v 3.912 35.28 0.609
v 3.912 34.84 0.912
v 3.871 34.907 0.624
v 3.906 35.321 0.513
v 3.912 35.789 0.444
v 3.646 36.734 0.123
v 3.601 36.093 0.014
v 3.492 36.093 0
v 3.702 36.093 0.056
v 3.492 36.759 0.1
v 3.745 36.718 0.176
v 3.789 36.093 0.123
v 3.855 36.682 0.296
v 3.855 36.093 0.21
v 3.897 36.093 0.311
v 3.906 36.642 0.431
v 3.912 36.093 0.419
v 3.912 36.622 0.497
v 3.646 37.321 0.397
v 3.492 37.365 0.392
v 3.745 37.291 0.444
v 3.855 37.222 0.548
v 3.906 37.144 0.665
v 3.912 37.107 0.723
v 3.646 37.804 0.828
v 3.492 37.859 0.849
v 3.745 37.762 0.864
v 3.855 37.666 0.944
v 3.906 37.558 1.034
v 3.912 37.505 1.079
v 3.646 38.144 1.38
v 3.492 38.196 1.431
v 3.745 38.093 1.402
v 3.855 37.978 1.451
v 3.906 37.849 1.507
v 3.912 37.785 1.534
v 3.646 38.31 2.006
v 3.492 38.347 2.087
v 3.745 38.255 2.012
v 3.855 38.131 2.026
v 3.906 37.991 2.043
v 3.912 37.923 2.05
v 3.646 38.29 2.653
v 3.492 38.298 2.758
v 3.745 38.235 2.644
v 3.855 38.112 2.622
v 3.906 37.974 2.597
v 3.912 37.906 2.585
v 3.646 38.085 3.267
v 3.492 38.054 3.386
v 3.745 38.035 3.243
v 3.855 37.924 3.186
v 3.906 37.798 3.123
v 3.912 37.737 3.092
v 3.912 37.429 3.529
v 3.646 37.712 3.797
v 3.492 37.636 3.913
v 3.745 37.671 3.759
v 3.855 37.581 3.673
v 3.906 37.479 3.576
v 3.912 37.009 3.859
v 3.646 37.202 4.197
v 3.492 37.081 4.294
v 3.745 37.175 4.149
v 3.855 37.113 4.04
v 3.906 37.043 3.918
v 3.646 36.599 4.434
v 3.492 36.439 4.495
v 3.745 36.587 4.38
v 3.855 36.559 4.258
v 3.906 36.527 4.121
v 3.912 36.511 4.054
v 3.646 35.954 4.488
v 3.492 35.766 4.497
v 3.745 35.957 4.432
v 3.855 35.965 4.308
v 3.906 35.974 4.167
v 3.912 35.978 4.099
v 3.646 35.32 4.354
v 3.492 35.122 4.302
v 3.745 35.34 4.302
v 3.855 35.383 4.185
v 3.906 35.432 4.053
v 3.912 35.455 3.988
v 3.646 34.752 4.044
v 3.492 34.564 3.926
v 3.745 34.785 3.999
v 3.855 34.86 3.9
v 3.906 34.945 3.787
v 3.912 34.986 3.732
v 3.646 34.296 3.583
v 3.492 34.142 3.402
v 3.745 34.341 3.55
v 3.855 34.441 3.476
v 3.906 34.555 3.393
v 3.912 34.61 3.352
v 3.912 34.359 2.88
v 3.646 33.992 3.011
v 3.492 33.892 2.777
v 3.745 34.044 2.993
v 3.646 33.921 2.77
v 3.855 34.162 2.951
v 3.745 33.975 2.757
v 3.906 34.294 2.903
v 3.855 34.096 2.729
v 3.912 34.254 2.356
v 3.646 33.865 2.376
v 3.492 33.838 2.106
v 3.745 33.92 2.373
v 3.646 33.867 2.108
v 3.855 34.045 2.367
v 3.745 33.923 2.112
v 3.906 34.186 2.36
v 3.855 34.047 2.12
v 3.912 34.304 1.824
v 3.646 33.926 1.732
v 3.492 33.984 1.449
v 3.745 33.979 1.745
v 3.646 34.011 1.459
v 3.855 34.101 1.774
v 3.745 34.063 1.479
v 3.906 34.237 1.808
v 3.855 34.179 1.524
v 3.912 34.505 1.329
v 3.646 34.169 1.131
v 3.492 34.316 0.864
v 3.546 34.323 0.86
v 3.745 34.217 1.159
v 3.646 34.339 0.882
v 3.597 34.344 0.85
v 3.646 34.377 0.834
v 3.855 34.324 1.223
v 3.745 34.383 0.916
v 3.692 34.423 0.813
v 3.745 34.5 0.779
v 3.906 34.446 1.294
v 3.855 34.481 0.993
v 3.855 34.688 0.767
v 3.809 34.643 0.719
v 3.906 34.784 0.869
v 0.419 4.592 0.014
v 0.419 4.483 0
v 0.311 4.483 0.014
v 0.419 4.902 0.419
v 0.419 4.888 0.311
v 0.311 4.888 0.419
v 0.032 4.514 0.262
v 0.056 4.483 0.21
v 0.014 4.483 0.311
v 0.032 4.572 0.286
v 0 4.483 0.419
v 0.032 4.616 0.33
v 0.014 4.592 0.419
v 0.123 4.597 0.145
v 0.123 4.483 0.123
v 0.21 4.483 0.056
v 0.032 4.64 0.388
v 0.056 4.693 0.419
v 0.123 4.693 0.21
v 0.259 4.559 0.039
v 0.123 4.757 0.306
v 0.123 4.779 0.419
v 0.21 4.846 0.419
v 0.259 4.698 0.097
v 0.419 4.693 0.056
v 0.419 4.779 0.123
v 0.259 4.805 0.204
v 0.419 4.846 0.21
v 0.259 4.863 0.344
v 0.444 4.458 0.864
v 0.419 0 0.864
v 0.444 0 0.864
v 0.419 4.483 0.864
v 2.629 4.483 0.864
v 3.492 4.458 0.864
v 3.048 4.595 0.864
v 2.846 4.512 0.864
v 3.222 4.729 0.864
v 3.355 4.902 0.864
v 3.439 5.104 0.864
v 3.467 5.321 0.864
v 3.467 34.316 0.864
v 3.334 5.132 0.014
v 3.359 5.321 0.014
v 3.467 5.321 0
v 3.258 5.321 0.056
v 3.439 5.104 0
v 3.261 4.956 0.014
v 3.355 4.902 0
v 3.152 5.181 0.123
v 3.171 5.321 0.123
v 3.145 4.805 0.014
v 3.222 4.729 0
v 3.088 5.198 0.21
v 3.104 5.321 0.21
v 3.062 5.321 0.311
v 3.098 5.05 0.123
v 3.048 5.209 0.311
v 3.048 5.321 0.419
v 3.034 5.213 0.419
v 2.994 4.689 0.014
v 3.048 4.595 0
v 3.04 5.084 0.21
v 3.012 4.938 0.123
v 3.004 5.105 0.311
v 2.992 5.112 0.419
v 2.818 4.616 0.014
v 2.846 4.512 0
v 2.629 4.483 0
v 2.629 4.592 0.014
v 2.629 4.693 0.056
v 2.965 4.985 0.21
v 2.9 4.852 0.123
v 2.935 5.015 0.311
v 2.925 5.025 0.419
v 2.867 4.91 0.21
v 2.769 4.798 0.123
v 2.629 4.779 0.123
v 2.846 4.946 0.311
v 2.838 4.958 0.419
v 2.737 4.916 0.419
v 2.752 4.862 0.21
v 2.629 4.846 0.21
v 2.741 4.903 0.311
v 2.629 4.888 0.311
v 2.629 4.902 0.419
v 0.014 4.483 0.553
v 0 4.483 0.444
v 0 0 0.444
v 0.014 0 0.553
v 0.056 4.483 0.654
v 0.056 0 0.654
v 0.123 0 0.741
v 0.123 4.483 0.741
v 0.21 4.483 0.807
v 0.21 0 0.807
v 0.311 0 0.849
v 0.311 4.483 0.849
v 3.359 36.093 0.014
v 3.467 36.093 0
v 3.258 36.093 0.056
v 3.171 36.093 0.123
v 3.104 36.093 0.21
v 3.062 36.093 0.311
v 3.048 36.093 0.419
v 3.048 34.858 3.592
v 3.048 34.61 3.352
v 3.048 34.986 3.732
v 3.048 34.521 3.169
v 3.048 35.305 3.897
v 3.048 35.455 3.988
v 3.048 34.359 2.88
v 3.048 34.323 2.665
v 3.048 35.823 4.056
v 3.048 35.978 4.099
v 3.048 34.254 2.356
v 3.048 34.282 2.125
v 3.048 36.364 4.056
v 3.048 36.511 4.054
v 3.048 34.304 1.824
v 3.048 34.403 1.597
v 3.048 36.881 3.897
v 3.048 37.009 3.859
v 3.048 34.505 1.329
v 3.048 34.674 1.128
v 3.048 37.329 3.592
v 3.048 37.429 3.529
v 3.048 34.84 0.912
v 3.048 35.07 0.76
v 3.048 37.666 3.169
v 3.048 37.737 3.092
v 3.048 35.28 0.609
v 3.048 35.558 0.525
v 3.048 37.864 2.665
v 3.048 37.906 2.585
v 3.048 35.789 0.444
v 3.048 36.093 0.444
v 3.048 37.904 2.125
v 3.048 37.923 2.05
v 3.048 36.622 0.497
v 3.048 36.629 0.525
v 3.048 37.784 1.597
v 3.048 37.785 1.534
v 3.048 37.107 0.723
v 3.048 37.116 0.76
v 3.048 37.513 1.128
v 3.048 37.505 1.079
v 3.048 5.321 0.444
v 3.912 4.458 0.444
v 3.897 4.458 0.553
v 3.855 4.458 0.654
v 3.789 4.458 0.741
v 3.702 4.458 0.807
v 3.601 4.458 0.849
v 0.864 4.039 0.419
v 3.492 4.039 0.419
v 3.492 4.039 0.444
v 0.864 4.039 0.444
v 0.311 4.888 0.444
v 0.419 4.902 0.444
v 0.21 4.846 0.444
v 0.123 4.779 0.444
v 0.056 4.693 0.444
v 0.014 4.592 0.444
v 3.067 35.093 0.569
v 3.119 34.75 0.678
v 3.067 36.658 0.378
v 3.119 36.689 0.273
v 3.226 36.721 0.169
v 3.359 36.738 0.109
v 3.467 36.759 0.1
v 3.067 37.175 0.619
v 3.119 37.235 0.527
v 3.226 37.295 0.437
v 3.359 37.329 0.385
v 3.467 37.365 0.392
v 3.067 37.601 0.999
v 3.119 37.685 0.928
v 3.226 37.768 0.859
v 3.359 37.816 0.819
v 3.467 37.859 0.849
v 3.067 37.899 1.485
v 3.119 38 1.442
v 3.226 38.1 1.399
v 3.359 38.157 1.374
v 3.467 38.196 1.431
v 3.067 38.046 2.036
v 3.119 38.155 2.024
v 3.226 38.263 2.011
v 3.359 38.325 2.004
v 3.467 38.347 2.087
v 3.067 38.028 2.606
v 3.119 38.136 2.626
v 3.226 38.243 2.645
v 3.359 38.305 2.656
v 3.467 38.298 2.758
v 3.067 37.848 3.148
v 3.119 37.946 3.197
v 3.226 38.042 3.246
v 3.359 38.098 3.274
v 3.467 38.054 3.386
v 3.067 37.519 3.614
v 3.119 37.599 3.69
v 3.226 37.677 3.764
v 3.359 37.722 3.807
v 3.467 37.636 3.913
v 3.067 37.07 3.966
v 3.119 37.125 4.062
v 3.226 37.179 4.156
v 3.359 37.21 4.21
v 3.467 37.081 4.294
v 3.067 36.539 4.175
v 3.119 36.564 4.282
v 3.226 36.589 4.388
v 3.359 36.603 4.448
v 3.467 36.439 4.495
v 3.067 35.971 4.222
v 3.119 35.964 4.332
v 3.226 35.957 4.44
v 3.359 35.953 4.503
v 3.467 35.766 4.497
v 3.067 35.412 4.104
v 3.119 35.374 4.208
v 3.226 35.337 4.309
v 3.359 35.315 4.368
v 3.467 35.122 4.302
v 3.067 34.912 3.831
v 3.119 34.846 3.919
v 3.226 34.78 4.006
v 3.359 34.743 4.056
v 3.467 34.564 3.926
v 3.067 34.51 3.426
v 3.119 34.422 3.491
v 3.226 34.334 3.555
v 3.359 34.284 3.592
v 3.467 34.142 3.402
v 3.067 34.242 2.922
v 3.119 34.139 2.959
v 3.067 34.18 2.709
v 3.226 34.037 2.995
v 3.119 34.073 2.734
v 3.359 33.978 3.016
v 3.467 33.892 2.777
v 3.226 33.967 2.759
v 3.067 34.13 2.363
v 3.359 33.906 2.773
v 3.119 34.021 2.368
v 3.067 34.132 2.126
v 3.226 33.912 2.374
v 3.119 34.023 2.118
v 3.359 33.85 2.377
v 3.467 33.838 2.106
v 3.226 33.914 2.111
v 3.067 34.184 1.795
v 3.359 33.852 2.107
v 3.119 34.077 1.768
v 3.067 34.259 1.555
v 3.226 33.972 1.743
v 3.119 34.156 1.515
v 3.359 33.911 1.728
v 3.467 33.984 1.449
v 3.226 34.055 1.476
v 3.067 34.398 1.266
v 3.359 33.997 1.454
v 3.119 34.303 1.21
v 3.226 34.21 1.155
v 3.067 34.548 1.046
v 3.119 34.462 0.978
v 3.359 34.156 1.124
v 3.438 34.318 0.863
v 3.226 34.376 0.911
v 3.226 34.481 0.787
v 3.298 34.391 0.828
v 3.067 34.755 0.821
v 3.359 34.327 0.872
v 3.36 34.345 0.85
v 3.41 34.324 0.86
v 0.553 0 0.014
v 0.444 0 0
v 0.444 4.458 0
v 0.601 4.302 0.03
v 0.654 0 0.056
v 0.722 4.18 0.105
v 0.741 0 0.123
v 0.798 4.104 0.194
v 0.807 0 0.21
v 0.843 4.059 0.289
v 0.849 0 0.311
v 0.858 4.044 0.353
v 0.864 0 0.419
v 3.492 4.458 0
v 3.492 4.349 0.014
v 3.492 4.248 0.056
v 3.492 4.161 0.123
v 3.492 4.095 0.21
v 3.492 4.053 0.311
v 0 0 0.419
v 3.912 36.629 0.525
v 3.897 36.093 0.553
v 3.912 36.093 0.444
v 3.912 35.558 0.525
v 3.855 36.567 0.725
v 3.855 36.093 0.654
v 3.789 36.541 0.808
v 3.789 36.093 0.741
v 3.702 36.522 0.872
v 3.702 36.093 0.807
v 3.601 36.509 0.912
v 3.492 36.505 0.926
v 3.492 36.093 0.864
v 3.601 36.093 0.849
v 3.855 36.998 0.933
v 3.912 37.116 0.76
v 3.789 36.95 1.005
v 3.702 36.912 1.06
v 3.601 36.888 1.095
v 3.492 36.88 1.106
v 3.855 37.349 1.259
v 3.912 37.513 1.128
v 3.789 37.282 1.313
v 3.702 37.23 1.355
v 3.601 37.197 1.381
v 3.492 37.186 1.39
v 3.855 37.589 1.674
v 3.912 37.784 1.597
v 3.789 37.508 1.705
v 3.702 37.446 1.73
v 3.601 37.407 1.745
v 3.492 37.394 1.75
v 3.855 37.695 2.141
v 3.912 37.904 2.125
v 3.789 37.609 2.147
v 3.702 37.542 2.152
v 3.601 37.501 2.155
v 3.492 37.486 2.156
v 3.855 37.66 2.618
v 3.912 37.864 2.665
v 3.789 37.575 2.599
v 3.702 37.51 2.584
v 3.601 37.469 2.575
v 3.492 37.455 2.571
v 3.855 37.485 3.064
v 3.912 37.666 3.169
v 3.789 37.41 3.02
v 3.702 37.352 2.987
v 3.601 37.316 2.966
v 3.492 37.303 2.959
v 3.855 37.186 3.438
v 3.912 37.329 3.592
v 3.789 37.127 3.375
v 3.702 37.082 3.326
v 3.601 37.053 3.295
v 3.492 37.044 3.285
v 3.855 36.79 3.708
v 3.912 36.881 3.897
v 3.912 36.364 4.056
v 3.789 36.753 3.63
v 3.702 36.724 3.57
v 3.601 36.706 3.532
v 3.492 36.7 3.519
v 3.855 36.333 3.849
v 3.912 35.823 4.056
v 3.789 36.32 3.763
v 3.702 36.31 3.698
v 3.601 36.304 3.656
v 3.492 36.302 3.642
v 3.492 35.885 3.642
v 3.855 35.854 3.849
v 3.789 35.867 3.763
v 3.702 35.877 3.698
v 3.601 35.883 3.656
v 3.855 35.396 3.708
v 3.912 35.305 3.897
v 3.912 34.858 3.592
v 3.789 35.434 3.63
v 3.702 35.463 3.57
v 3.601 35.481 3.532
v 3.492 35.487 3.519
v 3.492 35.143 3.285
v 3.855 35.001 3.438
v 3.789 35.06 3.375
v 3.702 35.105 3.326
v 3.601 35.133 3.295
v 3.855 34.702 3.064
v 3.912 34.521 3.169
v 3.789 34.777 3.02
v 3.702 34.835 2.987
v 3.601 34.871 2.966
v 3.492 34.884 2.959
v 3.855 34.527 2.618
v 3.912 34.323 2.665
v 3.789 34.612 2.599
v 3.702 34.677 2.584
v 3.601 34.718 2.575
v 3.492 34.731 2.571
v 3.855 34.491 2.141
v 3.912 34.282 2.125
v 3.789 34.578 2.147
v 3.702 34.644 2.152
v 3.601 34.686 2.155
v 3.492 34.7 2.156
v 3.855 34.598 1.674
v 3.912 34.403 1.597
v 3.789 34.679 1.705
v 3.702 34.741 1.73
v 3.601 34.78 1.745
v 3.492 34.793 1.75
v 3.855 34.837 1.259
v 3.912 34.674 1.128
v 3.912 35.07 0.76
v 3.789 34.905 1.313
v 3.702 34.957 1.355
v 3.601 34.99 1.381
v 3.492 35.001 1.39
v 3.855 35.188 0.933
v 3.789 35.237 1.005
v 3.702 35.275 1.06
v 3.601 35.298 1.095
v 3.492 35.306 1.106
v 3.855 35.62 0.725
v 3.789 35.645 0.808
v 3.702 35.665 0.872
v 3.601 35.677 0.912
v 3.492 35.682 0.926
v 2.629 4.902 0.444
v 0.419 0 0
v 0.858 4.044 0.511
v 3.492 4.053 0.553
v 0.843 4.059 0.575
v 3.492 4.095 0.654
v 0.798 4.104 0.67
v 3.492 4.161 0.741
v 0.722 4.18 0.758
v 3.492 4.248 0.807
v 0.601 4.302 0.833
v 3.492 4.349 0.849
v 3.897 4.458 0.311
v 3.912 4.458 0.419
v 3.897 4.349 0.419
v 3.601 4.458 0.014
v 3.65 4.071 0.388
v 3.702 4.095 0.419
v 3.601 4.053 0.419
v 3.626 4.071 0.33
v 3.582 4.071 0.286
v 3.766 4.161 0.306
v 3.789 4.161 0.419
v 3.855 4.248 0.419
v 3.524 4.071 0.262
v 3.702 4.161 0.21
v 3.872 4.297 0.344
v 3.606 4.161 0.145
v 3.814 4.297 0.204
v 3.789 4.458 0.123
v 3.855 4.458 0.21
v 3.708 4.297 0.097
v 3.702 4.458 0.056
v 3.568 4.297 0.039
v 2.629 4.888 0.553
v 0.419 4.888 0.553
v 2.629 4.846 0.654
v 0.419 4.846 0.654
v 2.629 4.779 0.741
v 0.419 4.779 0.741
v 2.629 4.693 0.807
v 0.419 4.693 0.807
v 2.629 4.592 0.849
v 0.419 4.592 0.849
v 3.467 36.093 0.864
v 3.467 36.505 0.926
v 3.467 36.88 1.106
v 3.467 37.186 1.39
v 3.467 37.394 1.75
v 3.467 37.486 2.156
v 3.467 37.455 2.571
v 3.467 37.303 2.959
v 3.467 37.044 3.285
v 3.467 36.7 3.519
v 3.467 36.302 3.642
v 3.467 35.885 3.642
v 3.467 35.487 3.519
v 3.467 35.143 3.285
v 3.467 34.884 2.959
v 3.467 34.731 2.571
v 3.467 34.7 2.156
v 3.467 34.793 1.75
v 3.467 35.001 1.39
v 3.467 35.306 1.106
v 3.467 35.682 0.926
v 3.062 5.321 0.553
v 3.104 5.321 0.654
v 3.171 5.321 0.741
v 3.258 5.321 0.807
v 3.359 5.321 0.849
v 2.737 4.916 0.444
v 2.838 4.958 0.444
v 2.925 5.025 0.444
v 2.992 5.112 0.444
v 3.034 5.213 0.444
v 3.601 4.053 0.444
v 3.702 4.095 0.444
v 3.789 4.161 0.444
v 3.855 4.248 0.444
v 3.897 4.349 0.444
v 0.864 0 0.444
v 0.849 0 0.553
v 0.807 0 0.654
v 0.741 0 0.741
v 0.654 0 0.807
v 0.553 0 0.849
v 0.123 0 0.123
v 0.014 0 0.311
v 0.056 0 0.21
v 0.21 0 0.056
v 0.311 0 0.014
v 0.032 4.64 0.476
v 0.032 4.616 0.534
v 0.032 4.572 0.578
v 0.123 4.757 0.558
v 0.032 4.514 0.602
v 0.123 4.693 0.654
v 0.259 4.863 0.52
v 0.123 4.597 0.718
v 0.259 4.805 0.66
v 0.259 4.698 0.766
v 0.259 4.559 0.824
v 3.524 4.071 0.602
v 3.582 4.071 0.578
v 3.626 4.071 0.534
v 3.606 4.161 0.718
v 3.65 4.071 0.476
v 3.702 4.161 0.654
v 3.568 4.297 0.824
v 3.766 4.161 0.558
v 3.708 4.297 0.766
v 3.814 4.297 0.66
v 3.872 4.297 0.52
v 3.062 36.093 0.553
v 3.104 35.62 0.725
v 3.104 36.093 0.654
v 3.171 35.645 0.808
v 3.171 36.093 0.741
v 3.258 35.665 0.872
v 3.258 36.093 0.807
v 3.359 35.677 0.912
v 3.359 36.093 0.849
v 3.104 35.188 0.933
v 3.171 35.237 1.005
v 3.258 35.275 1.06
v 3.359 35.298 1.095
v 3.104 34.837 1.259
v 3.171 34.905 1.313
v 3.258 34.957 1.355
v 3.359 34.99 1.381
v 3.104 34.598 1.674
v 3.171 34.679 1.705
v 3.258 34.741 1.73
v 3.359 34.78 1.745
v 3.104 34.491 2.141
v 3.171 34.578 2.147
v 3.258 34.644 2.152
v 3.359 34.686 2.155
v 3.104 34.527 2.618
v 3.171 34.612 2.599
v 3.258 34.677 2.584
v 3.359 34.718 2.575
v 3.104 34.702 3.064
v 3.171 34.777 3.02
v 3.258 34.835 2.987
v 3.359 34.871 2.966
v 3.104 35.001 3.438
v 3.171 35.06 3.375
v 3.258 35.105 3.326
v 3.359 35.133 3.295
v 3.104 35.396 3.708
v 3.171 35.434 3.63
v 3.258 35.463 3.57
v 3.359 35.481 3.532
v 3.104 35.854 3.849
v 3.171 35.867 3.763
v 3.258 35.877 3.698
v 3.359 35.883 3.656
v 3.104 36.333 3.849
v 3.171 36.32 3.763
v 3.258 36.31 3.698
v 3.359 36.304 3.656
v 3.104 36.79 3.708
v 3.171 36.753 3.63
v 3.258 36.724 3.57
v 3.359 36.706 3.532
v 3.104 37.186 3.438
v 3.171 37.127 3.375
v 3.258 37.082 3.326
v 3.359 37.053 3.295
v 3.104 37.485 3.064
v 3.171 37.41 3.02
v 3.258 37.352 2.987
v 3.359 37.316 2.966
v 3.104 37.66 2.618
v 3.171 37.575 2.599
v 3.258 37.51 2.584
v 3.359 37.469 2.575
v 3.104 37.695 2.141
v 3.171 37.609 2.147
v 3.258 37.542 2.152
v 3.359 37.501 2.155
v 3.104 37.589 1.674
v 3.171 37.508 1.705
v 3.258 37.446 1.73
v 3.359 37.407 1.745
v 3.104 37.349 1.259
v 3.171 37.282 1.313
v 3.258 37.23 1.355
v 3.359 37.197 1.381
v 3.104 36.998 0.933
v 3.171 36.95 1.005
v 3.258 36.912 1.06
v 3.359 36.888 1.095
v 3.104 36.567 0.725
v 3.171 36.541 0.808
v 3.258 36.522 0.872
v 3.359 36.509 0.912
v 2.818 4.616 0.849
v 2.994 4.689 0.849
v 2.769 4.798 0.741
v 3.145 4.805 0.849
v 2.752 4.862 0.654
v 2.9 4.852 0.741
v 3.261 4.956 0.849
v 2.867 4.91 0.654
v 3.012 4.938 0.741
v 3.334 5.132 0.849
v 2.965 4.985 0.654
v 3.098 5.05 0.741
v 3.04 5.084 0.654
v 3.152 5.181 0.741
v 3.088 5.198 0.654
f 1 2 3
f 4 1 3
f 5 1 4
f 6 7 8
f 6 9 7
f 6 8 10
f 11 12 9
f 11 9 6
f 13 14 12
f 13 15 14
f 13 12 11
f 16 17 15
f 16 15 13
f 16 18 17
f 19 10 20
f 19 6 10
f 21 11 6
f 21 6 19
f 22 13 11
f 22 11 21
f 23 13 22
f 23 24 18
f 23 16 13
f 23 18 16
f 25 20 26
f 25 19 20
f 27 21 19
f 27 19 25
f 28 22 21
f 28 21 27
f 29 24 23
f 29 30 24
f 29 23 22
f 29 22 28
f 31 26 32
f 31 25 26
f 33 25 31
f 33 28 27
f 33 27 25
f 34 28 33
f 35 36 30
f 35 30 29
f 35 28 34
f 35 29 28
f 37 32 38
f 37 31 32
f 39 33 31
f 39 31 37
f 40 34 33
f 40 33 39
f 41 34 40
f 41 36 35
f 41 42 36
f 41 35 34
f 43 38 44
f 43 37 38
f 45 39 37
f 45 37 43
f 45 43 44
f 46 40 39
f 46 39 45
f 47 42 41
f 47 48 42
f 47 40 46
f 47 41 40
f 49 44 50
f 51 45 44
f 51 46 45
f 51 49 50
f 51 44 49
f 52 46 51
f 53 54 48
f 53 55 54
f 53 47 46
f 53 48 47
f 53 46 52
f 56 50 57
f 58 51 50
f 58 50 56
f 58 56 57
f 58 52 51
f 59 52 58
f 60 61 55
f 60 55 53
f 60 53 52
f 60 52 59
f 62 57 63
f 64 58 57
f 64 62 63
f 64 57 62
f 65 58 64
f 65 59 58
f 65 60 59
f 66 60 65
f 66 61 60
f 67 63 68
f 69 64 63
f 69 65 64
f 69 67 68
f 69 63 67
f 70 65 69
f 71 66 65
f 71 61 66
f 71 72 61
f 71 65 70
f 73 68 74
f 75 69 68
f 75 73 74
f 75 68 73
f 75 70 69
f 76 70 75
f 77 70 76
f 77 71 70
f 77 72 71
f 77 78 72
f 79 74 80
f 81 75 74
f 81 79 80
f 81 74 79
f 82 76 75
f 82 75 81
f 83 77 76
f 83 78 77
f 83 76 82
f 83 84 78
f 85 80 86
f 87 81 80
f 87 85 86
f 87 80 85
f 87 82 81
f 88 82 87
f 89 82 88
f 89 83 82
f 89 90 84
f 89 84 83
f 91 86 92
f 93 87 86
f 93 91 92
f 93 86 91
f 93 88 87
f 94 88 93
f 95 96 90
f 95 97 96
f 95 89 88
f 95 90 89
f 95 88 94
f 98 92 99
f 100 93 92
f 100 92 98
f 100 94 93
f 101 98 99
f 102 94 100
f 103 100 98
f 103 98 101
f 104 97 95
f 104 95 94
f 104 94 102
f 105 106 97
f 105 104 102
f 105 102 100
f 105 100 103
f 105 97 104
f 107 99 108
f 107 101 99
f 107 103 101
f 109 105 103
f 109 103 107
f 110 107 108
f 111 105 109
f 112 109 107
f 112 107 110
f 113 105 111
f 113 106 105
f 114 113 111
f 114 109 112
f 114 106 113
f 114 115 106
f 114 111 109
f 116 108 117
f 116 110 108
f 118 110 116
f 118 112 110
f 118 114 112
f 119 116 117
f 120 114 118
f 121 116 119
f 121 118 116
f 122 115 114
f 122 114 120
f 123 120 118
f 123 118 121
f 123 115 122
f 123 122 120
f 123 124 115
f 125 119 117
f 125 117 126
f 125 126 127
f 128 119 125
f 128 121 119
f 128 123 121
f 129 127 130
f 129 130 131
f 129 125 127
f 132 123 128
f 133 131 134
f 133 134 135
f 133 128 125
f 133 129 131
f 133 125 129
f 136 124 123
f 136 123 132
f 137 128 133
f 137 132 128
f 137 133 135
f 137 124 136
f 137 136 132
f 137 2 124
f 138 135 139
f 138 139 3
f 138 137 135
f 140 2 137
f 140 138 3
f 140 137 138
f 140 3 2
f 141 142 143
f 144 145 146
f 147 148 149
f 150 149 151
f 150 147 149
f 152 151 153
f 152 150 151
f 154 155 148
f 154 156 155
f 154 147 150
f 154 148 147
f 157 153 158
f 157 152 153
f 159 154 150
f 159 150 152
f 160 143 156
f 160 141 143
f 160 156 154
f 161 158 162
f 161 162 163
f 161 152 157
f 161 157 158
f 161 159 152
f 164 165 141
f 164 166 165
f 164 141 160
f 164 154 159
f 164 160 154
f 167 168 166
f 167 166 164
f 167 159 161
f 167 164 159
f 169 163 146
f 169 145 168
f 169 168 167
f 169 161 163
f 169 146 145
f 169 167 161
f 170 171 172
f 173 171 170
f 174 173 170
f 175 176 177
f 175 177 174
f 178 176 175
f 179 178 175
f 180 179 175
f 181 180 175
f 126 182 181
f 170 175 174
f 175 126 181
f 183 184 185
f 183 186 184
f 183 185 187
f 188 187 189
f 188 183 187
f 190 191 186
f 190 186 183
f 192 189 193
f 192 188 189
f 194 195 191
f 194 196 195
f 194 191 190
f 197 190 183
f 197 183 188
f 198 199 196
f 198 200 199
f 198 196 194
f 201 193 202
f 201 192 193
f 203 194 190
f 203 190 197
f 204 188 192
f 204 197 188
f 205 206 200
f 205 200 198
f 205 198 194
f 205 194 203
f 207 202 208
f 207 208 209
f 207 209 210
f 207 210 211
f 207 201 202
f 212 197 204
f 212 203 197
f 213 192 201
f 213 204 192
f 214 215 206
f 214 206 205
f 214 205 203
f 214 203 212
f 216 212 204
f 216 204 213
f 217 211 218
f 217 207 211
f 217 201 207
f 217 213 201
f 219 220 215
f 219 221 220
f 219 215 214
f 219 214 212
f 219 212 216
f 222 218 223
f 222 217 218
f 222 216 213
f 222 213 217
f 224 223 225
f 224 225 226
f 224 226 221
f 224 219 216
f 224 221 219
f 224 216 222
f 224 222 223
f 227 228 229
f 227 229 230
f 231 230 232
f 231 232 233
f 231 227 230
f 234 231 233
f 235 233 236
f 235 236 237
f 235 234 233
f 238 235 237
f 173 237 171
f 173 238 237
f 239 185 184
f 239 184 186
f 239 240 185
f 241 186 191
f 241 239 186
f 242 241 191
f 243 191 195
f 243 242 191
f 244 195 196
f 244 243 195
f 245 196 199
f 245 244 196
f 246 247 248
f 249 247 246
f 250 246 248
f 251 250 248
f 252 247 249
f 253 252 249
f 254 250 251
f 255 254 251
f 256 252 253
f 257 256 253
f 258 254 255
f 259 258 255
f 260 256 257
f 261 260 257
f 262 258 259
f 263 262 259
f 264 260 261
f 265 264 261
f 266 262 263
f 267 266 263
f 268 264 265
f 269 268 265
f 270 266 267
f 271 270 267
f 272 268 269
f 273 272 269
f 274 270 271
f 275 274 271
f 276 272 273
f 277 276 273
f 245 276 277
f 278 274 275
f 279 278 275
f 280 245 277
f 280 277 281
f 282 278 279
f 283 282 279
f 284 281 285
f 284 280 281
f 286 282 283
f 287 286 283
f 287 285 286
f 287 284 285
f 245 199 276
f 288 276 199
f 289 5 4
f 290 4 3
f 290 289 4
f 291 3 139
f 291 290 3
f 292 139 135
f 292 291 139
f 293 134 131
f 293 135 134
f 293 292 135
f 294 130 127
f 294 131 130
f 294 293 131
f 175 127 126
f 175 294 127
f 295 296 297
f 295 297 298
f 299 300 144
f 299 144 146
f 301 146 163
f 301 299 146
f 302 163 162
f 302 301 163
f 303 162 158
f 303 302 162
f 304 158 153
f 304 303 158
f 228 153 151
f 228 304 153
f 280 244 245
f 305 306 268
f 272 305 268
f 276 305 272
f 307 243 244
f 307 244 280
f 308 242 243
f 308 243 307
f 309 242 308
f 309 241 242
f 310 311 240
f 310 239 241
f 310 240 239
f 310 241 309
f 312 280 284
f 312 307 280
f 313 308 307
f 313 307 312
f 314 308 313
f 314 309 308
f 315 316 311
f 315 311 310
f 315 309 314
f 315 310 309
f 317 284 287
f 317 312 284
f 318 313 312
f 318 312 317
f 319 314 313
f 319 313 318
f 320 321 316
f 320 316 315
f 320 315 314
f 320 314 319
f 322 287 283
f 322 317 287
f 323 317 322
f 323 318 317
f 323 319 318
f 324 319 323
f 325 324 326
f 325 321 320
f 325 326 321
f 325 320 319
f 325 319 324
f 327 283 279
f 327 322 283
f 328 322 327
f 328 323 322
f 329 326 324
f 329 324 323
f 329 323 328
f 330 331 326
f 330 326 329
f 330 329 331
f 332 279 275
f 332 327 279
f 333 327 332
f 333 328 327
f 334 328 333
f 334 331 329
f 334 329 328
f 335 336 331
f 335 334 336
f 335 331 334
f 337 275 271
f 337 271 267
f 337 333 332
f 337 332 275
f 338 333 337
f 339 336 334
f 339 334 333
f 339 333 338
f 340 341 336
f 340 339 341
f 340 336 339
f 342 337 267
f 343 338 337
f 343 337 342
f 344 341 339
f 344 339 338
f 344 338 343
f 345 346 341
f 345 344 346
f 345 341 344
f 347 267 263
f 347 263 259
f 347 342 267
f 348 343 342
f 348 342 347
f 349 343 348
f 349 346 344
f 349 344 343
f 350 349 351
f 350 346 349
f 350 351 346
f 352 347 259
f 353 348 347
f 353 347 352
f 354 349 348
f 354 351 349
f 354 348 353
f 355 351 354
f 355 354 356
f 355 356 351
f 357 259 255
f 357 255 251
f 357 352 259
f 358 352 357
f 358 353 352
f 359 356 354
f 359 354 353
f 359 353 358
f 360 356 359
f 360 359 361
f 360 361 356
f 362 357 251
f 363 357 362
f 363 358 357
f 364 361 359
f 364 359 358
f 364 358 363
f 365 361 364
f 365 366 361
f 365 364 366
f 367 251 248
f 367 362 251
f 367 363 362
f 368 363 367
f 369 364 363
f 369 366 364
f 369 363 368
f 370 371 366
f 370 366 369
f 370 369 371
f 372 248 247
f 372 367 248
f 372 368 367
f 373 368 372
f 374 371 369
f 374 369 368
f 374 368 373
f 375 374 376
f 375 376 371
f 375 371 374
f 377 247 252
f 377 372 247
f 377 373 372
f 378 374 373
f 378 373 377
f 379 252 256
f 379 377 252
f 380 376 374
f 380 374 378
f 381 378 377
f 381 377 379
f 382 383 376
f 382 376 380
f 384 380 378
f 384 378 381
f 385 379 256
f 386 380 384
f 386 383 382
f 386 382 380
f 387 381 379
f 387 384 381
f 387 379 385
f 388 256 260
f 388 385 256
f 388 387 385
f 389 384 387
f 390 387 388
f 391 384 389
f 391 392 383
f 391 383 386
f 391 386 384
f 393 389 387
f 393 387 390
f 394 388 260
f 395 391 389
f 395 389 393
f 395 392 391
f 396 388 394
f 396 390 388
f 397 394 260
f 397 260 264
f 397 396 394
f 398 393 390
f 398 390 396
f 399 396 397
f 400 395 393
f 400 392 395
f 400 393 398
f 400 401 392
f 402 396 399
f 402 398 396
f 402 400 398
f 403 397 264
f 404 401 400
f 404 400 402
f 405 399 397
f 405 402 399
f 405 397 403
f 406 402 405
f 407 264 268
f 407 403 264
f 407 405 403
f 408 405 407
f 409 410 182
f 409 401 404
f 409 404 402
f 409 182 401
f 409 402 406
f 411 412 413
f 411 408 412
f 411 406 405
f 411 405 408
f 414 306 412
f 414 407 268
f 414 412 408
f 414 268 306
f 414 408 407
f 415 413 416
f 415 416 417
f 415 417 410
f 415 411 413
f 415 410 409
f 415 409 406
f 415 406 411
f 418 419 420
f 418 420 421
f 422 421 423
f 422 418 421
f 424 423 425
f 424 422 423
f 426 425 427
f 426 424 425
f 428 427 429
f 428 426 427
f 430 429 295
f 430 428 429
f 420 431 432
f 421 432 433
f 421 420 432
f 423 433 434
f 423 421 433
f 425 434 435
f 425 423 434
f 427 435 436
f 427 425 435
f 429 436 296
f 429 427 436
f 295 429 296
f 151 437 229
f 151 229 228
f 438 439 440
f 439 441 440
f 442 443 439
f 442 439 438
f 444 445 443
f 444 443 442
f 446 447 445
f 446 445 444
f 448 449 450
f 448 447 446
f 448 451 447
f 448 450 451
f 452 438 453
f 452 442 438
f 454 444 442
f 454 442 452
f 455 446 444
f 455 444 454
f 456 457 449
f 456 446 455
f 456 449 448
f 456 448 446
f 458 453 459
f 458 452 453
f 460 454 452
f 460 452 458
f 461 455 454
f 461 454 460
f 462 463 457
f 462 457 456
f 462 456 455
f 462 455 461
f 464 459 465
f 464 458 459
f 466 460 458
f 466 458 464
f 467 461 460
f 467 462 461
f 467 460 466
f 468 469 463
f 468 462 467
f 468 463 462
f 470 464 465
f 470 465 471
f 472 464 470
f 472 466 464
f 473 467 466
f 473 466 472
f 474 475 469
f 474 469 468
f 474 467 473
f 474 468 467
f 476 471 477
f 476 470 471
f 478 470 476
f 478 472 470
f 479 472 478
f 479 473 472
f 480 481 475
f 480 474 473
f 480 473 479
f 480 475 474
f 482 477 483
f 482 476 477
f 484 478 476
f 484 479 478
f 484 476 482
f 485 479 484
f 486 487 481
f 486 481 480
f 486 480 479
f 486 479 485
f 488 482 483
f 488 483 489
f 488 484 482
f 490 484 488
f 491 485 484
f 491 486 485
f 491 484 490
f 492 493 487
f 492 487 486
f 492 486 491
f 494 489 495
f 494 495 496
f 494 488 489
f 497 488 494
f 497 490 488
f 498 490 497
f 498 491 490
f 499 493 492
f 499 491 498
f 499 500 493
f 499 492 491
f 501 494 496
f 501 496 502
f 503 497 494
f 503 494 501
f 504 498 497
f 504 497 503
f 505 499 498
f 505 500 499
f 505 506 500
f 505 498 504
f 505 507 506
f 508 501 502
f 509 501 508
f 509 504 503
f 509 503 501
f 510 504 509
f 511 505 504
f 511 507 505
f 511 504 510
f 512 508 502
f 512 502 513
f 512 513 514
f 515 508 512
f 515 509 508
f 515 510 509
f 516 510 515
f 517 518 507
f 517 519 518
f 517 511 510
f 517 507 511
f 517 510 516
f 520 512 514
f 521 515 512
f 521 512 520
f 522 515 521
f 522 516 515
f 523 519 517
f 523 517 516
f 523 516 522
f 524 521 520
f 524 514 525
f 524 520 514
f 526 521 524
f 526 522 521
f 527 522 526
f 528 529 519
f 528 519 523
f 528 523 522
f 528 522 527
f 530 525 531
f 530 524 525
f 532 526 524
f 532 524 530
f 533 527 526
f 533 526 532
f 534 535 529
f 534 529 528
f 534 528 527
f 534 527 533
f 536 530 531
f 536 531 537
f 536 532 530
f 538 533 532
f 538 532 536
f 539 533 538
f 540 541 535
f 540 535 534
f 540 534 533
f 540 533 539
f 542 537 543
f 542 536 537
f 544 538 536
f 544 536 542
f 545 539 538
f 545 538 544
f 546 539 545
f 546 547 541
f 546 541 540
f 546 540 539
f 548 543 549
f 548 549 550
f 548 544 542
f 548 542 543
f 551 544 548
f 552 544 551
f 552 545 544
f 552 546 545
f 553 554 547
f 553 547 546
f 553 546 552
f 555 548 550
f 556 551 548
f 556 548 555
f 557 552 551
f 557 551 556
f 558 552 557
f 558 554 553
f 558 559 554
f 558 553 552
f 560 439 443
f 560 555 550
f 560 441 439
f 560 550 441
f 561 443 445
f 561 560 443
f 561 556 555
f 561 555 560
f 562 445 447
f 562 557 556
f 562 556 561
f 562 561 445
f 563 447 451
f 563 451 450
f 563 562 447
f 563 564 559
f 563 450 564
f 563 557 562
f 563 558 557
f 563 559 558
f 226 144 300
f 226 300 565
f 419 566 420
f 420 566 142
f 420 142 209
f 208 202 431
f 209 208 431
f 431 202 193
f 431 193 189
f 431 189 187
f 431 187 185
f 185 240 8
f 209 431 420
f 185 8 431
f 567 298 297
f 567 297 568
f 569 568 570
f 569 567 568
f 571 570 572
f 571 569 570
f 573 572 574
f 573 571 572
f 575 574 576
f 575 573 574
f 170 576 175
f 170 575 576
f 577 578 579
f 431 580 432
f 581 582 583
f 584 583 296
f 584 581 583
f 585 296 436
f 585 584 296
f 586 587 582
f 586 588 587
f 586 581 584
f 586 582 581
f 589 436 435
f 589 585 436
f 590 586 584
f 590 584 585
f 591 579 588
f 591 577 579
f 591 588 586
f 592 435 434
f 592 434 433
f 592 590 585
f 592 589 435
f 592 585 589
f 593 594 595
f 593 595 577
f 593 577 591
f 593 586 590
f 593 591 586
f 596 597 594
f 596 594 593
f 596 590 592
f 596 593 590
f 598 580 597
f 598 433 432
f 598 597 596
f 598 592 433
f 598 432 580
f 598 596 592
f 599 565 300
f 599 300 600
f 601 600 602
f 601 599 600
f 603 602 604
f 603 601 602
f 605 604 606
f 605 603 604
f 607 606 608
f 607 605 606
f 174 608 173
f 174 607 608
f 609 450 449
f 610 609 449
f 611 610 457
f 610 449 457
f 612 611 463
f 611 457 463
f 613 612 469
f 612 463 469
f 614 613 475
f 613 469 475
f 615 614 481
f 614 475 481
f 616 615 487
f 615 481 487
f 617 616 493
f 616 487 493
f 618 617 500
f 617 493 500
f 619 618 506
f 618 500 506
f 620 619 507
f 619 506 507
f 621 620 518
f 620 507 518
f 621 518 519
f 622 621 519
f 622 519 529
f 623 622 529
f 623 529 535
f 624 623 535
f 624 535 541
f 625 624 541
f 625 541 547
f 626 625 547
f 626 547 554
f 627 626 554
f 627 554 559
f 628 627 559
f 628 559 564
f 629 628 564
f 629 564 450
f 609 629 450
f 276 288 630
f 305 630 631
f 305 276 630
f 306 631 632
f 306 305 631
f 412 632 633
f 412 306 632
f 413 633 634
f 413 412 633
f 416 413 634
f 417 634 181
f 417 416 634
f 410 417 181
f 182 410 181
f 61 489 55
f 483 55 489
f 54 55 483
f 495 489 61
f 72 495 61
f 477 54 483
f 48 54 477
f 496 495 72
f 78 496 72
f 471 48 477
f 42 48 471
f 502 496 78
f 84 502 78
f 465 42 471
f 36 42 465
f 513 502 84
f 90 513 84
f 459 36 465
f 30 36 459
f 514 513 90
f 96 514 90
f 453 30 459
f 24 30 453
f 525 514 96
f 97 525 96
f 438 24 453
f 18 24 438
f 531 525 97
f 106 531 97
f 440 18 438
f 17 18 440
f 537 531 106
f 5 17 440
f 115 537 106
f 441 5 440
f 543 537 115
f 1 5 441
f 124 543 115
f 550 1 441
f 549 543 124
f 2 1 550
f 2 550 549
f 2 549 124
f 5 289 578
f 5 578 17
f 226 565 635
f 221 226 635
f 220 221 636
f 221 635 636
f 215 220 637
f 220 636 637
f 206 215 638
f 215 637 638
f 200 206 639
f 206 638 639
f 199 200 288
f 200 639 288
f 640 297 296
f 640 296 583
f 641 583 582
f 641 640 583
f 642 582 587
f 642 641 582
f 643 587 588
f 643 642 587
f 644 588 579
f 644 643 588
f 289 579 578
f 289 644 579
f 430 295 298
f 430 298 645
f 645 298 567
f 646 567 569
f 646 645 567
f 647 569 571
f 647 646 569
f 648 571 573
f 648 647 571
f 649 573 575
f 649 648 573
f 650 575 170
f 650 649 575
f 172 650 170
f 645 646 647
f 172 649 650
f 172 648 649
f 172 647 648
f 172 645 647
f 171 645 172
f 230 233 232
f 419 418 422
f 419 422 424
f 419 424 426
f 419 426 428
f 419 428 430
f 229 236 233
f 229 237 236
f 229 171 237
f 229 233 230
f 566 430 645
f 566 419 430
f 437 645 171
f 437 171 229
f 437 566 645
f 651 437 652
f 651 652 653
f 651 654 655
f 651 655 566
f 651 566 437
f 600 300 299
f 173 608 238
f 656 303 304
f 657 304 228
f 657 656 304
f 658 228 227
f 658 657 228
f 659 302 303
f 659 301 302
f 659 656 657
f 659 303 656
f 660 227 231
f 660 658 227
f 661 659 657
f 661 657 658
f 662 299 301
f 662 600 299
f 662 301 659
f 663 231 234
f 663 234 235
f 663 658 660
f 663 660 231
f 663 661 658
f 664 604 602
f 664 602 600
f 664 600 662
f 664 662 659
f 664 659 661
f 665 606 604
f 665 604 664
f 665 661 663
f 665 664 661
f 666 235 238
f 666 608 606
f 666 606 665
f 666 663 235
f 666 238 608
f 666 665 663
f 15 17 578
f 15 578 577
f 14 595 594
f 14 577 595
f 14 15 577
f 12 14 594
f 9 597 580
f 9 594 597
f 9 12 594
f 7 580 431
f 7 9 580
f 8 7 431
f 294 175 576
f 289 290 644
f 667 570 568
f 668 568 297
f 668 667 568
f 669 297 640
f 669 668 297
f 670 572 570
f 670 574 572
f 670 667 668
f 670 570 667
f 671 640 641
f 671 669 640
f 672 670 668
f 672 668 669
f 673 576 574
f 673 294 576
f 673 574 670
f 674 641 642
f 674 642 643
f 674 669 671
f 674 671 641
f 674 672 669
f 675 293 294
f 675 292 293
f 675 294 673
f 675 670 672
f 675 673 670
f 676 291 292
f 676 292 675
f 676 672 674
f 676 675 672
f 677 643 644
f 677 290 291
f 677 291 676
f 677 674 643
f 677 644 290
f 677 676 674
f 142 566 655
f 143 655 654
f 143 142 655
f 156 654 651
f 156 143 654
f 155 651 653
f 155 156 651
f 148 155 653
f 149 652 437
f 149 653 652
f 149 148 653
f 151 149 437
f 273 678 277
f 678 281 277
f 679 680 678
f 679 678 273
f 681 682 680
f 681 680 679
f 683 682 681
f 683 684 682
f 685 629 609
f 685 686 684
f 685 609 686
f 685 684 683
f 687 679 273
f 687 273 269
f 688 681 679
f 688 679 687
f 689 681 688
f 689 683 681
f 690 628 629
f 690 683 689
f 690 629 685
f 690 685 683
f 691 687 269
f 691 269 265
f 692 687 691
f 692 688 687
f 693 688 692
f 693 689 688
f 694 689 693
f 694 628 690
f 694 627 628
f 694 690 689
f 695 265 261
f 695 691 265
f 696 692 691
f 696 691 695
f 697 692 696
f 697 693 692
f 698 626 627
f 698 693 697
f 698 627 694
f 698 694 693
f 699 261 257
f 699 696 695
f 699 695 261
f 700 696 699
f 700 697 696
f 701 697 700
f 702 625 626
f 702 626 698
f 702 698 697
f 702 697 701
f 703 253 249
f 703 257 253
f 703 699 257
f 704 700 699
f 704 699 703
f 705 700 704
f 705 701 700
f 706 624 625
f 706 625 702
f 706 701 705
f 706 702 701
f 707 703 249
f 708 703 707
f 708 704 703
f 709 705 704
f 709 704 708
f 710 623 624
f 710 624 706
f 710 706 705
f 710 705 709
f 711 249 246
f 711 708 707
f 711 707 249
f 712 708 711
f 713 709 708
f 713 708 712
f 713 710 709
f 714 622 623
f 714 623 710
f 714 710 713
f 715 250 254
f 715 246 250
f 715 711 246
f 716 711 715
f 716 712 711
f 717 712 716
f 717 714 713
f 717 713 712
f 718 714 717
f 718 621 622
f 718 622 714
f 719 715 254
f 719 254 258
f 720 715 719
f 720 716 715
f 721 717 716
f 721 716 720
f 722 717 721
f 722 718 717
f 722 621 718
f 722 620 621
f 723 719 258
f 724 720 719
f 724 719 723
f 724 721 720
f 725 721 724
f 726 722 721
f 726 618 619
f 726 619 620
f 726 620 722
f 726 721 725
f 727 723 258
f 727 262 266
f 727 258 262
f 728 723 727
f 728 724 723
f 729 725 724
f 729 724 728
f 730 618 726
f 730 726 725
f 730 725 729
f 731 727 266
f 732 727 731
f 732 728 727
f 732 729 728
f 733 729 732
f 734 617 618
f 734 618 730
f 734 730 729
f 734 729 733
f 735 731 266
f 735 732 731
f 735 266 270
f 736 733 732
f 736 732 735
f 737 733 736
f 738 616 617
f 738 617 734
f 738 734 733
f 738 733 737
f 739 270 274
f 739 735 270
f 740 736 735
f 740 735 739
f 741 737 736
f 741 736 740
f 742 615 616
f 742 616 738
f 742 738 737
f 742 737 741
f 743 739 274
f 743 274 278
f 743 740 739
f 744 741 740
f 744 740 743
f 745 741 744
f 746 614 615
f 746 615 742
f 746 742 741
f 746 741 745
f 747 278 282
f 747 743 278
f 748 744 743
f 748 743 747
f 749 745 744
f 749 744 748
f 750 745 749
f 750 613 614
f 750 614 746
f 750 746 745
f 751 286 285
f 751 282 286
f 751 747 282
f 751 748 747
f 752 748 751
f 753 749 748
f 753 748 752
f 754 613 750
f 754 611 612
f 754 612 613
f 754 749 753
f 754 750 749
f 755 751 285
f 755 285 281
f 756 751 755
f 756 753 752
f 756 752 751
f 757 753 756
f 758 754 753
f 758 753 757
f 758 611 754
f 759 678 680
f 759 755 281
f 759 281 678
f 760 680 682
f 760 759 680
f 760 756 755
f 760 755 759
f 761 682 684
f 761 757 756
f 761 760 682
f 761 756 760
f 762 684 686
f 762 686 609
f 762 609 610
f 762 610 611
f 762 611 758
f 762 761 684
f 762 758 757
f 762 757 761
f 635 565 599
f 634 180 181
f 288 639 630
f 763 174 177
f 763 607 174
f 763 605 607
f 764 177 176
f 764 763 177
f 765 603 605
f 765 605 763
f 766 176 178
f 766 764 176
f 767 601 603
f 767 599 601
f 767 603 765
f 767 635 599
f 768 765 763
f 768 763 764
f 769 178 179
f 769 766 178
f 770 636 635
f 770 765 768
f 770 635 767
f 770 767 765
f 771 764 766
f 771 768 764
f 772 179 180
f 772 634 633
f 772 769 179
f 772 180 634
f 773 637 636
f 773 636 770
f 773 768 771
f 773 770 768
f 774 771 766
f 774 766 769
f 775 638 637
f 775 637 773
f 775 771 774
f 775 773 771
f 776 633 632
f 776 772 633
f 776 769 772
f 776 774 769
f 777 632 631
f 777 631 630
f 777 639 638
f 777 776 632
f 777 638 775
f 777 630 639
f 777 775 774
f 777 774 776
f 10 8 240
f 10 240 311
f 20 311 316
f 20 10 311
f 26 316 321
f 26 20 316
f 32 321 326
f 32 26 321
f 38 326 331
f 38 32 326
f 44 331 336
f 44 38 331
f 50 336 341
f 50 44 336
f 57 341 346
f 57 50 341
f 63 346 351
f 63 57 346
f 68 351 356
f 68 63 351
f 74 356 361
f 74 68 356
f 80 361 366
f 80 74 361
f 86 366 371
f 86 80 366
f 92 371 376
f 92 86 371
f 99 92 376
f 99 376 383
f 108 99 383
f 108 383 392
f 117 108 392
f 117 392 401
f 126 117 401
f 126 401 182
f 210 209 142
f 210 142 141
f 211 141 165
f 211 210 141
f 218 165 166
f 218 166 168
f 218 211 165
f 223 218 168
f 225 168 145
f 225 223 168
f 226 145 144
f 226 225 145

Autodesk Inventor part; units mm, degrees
ref_plane "YZ Plane" through (0, 0, 0) normal (1, 0, 0) x (0, 1, 0)
ref_plane "XZ Plane" through (0, 0, 0) normal (0, 1, 0) x (-1, 0, 0)
ref_plane "XY Plane" through (0, 0, 0) normal (0, 0, 1) x (1, 0, 0)
sketch "Sketch1" plane through (0, 0, 0) normal (0, 0, 1) x (1, 0, 0)
  line L0 (0, 0) -> (0, 4.9022)
  line L1 (0, 4.9022) -> (3.048, 4.9022)
  line L2 (3.048, 4.9022) -> (3.048, 36.0934)
  line L3 (3.048, 36.0934) -> (3.9116, 36.0934)
  line L4 (3.9116, 36.0934) -> (3.9116, 4.0386)
  line L5 (3.9116, 4.0386) -> (0.8636, 4.0386)
  line L6 (0.8636, 4.0386) -> (0.8636, 0)
  line L7 (0.8636, 0) -> (0, 0)
  dimension "d4" = 3.9116
  dimension "d5" = 4.9022
  dimension "d6" = 32.0548
  dimension "d9" = 0.8636
  dimension "d10" = 0.8636
  dimension "d11" = 0.8636
extrude "Extrusion1" add sketch "Sketch1" along normal blind 0.8636
sketch "Sketch2" plane through (3.9116, 4.0386, 0) normal (1, 0, 0) x (0, 0, -1)
  line L0 (0, 0.8636) -> (0, 32.0548) projected
  line L1 (-0.8636, 0) -> (-0.8636, 32.0548) projected
  circle A0 centre (-2.2606, 32.0548) radius 1.397
  circle A1 centre (-2.2606, 32.0548) radius 2.2606
  point P0 (0, -4.0386)
  dimension "d12" = 2.794
extrude "Extrusion3" add sketch "Sketch2" against normal up to surface (0.8636 mm away)
fillet "Fillet1" radius 0.4191 19 edges at (3.9116, 37.0814, 4.2939) (3.9116, 20.066, 0) (3.048, 37.0814, 4.2939) (3.048, 20.4978, 0) (3.9116, 19.1774, 0.8636) (3.048, 19.6092, 0.8636) (1.524, 4.9022, 0) (2.3876, 4.0386, 0) (1.524, 4.9022, 0.8636) (0.8636, 2.0193, 0) (0, 2.4511, 0) (0.8636, 2.0193, 0.8636) (0, 2.4511, 0.8636) (2.3876, 4.0386, 0.8636) (0, 4.9022, 0.4318) (3.9116, 4.0386, 0.4318) (3.048, 4.9022, 0.4318) (3.9116, 36.0934, 3.6576) (3.048, 36.0934, 3.6576)
equation "\"d10\" = d9"
equation "\"d11\" = d9"
properties part number "rod"
